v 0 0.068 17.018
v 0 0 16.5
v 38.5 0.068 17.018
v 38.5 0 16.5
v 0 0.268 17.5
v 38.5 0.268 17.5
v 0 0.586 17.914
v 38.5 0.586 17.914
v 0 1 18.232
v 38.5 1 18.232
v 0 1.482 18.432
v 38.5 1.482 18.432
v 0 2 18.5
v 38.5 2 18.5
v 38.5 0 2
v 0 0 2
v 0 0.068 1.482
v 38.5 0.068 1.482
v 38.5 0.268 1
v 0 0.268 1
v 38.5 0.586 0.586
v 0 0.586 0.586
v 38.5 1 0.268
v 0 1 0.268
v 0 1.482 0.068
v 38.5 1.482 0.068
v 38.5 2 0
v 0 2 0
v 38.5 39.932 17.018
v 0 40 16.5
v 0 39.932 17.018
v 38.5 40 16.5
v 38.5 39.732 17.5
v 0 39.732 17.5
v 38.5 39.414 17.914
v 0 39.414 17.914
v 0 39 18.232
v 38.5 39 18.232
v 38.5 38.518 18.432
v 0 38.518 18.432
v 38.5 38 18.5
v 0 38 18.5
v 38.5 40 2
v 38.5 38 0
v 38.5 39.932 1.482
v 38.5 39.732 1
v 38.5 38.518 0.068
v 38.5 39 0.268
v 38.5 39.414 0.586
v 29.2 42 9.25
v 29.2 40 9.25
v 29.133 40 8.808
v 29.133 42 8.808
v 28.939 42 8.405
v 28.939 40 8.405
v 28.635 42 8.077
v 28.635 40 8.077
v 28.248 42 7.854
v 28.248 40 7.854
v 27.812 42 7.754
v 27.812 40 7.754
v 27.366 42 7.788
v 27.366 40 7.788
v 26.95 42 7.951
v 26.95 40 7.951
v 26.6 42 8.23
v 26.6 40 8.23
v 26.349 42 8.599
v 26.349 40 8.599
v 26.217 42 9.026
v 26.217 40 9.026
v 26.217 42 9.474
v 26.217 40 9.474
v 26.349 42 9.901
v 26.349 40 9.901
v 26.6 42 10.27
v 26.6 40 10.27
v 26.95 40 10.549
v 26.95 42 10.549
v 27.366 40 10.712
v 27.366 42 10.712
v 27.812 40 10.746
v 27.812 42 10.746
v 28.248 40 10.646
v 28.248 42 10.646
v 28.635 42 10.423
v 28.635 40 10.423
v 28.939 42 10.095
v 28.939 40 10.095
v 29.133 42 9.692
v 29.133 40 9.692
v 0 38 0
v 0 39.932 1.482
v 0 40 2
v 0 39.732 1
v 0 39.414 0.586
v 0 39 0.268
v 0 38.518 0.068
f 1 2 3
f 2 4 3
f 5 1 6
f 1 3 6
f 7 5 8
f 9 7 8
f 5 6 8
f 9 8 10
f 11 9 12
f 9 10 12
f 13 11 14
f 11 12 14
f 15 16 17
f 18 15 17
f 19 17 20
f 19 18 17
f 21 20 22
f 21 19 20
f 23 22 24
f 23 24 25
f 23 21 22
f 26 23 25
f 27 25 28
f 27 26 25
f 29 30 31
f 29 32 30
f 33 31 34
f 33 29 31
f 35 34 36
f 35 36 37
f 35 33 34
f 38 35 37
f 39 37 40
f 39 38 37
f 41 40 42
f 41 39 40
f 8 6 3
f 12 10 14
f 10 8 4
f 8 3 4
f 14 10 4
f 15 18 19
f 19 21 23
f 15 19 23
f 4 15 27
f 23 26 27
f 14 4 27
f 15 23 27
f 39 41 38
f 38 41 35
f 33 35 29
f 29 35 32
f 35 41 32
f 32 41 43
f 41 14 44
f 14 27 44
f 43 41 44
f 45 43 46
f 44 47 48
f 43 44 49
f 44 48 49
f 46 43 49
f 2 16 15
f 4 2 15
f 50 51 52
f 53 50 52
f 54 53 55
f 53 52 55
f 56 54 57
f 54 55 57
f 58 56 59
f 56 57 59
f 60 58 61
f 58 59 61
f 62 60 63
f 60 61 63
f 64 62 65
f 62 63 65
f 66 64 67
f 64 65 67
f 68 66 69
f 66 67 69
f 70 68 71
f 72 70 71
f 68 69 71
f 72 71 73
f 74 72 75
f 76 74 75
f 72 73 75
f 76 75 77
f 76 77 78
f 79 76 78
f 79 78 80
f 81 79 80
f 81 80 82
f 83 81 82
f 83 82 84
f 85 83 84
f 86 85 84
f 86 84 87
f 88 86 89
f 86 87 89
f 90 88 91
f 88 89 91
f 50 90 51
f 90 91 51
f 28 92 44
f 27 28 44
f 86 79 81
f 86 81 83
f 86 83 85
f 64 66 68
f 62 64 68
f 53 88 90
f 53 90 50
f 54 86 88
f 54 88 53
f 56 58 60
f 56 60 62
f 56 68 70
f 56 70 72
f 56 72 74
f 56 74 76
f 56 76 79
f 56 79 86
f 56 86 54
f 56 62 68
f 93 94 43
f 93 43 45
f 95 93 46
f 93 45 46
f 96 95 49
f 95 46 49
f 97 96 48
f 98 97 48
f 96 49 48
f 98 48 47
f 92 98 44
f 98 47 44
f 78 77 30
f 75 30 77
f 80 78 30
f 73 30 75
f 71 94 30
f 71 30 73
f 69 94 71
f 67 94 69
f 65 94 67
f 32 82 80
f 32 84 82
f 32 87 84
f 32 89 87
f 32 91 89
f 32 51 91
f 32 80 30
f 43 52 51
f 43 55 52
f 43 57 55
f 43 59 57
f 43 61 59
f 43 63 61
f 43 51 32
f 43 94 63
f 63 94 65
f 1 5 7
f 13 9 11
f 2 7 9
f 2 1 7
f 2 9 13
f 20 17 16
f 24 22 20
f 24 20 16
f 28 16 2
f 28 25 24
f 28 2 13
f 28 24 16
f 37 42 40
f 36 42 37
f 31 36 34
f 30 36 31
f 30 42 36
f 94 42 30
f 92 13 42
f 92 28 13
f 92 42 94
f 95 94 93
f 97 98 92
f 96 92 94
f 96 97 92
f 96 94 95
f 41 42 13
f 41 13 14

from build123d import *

# Parameters (mm, degrees)
SKETCH2_W           = 38.5
SKETCH2_H           = 40
BOSS_EXTRUDE1_DEPTH = 18.5
FILLET1_R           = 2
SKETCH3_R           = 1.5
BOSS_EXTRUDE2_DEPTH = 2


with BuildPart() as part:
    # Sketch2 → Boss-Extrude1 (new body)
    with BuildSketch(Plane.XY):
        with Locations((19.25, 20)):
            Rectangle(SKETCH2_W, SKETCH2_H)
    extrude(amount=BOSS_EXTRUDE1_DEPTH)

    # Fillet1
    fillet1_edges = [part.edges().sort_by_distance(p)[0] for p in [
        (19.25, 40, 18.5),
        (19.25, 40, 0),
        (19.25, 0, 0),
        (19.25, 0, 18.5),
    ]]
    fillet(fillet1_edges, radius=FILLET1_R)

    # Sketch3 → Boss-Extrude2 (add)
    with BuildSketch(Plane(origin=(0, 40, 0), x_dir=(1, 0, 0), z_dir=(0, 1, 0))):
        with Locations((27.7, -9.25)):
            Circle(SKETCH3_R)
    extrude(amount=BOSS_EXTRUDE2_DEPTH)


solid = part.part
